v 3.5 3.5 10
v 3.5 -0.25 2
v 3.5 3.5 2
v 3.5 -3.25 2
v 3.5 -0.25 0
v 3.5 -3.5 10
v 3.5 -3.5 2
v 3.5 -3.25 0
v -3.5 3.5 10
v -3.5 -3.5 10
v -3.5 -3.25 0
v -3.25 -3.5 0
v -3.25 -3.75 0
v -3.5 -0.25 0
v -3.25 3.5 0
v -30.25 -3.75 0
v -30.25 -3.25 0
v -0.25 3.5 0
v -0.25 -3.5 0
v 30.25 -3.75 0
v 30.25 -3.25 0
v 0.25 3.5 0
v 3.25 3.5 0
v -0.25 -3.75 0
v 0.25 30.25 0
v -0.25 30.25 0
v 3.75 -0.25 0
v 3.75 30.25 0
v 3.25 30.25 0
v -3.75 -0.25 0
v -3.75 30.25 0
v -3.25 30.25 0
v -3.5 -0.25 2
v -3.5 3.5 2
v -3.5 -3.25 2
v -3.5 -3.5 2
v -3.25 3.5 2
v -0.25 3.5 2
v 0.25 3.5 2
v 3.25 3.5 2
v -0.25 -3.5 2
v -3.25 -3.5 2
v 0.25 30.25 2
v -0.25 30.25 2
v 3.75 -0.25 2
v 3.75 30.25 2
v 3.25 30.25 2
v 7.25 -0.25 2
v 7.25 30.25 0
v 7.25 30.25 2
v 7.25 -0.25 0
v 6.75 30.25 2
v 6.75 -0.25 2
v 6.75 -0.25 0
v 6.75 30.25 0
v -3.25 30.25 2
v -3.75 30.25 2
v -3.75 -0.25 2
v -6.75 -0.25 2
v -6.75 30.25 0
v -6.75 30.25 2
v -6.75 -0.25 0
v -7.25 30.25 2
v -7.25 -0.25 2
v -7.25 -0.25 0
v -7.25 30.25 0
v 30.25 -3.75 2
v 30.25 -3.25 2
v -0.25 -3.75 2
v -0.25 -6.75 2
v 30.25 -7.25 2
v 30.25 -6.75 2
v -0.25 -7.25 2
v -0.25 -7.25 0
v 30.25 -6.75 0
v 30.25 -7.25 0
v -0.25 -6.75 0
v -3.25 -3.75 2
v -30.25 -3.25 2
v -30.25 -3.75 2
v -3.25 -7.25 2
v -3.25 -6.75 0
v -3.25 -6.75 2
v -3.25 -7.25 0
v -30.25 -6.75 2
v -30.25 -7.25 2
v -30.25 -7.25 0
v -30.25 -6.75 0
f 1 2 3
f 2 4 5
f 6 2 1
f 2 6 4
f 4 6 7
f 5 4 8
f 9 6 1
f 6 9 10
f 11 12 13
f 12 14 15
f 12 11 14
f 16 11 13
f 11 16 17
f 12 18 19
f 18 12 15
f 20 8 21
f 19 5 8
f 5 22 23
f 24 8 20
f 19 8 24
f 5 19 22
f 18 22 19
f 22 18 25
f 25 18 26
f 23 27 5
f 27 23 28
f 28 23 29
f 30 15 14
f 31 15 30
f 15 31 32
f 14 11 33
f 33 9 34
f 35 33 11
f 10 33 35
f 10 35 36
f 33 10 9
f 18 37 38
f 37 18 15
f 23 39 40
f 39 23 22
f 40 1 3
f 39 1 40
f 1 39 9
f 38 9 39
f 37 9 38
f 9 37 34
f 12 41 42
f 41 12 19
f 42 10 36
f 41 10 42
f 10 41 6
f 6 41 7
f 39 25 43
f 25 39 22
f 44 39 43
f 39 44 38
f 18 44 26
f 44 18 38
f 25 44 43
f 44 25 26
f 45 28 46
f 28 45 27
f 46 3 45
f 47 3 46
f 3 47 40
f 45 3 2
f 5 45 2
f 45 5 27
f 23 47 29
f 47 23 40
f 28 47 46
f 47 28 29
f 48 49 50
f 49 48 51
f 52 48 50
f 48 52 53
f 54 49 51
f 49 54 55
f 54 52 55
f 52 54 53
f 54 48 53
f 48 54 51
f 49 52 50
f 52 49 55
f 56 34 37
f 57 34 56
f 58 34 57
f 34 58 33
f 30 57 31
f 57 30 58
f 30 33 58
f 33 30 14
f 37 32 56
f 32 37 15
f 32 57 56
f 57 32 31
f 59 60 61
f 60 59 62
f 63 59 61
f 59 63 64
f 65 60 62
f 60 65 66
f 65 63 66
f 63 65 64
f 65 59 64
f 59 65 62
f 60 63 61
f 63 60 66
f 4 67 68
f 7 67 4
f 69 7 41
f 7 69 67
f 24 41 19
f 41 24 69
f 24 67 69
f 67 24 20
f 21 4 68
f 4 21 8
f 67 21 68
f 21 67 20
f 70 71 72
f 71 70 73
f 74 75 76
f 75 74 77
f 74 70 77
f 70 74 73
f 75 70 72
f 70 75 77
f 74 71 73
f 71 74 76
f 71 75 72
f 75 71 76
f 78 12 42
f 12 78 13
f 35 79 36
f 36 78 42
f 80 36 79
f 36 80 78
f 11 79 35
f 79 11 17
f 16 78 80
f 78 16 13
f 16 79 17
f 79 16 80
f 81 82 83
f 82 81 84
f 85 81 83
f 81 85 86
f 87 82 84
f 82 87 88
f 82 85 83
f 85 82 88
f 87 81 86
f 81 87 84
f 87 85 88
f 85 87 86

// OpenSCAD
translate([0, 0, 5]) color([0,1,0,0.9]) cube([7, 7, 10], center=true);
translate([0.0, 0.0, 1]) color([1,0,0]) cube([0.5, 0.5, 2], center=true);
translate([0.0, 0.5, 1]) color([1,0,0]) cube([0.5, 0.5, 2], center=true);
translate([0.0, 1.0, 1]) color([1,0,0]) cube([0.5, 0.5, 2], center=true);
translate([0.0, 1.5, 1]) color([1,0,0]) cube([0.5, 0.5, 2], center=true);
translate([0.0, 2.0, 1]) color([1,0,0]) cube([0.5, 0.5, 2], center=true);
translate([0.0, 2.5, 1]) color([1,0,0]) cube([0.5, 0.5, 2], center=true);
translate([0.0, 3.0, 1]) color([1,0,0]) cube([0.5, 0.5, 2], center=true);
translate([0.0, 3.5, 1]) color([1,0,0]) cube([0.5, 0.5, 2], center=true);
translate([0.0, 4.0, 1]) color([1,0,0]) cube([0.5, 0.5, 2], center=true);
translate([0.0, 4.5, 1]) color([1,0,0]) cube([0.5, 0.5, 2], center=true);
translate([0.0, 5.0, 1]) color([1,0,0]) cube([0.5, 0.5, 2], center=true);
translate([0.0, 5.5, 1]) color([1,0,0]) cube([0.5, 0.5, 2], center=true);
translate([0.0, 6.0, 1]) color([1,0,0]) cube([0.5, 0.5, 2], center=true);
translate([0.0, 6.5, 1]) color([1,0,0]) cube([0.5, 0.5, 2], center=true);
translate([0.0, 7.0, 1]) color([1,0,0]) cube([0.5, 0.5, 2], center=true);
translate([0.0, 7.5, 1]) color([1,0,0]) cube([0.5, 0.5, 2], center=true);
translate([0.0, 8.0, 1]) color([1,0,0]) cube([0.5, 0.5, 2], center=true);
translate([0.0, 8.5, 1]) color([1,0,0]) cube([0.5, 0.5, 2], center=true);
translate([0.0, 9.0, 1]) color([1,0,0]) cube([0.5, 0.5, 2], center=true);
translate([0.0, 9.5, 1]) color([1,0,0]) cube([0.5, 0.5, 2], center=true);
translate([0.0, 10.0, 1]) color([1,0,0]) cube([0.5, 0.5, 2], center=true);
translate([0.0, 10.5, 1]) color([1,0,0]) cube([0.5, 0.5, 2], center=true);
translate([0.0, 11.0, 1]) color([1,0,0]) cube([0.5, 0.5, 2], center=true);
translate([0.0, 11.5, 1]) color([1,0,0]) cube([0.5, 0.5, 2], center=true);
translate([0.0, 12.0, 1]) color([1,0,0]) cube([0.5, 0.5, 2], center=true);
translate([0.0, 12.5, 1]) color([1,0,0]) cube([0.5, 0.5, 2], center=true);
translate([0.0, 13.0, 1]) color([1,0,0]) cube([0.5, 0.5, 2], center=true);
translate([0.0, 13.5, 1]) color([1,0,0]) cube([0.5, 0.5, 2], center=true);
translate([0.0, 14.0, 1]) color([1,0,0]) cube([0.5, 0.5, 2], center=true);
translate([0.0, 14.5, 1]) color([1,0,0]) cube([0.5, 0.5, 2], center=true);
translate([0.0, 15.0, 1]) color([1,0,0]) cube([0.5, 0.5, 2], center=true);
translate([0.0, 15.5, 1]) color([1,0,0]) cube([0.5, 0.5, 2], center=true);
translate([0.0, 16.0, 1]) color([1,0,0]) cube([0.5, 0.5, 2], center=true);
translate([0.0, 16.5, 1]) color([1,0,0]) cube([0.5, 0.5, 2], center=true);
translate([0.0, 17.0, 1]) color([1,0,0]) cube([0.5, 0.5, 2], center=true);
translate([0.0, 17.5, 1]) color([1,0,0]) cube([0.5, 0.5, 2], center=true);
translate([0.0, 18.0, 1]) color([1,0,0]) cube([0.5, 0.5, 2], center=true);
translate([0.0, 18.5, 1]) color([1,0,0]) cube([0.5, 0.5, 2], center=true);
translate([0.0, 19.0, 1]) color([1,0,0]) cube([0.5, 0.5, 2], center=true);
translate([0.0, 19.5, 1]) color([1,0,0]) cube([0.5, 0.5, 2], center=true);
translate([0.0, 20.0, 1]) color([1,0,0]) cube([0.5, 0.5, 2], center=true);
translate([0.0, 20.5, 1]) color([1,0,0]) cube([0.5, 0.5, 2], center=true);
translate([0.0, 21.0, 1]) color([1,0,0]) cube([0.5, 0.5, 2], center=true);
translate([0.0, 21.5, 1]) color([1,0,0]) cube([0.5, 0.5, 2], center=true);
translate([0.0, 22.0, 1]) color([1,0,0]) cube([0.5, 0.5, 2], center=true);
translate([0.0, 22.5, 1]) color([1,0,0]) cube([0.5, 0.5, 2], center=true);
translate([0.0, 23.0, 1]) color([1,0,0]) cube([0.5, 0.5, 2], center=true);
translate([0.0, 23.5, 1]) color([1,0,0]) cube([0.5, 0.5, 2], center=true);
translate([0.0, 24.0, 1]) color([1,0,0]) cube([0.5, 0.5, 2], center=true);
translate([0.0, 24.5, 1]) color([1,0,0]) cube([0.5, 0.5, 2], center=true);
translate([0.0, 25.0, 1]) color([1,0,0]) cube([0.5, 0.5, 2], center=true);
translate([0.0, 25.5, 1]) color([1,0,0]) cube([0.5, 0.5, 2], center=true);
translate([0.0, 26.0, 1]) color([1,0,0]) cube([0.5, 0.5, 2], center=true);
translate([0.0, 26.5, 1]) color([1,0,0]) cube([0.5, 0.5, 2], center=true);
translate([0.0, 27.0, 1]) color([1,0,0]) cube([0.5, 0.5, 2], center=true);
translate([0.0, 27.5, 1]) color([1,0,0]) cube([0.5, 0.5, 2], center=true);
translate([0.0, 28.0, 1]) color([1,0,0]) cube([0.5, 0.5, 2], center=true);
translate([0.0, 28.5, 1]) color([1,0,0]) cube([0.5, 0.5, 2], center=true);
translate([0.0, 29.0, 1]) color([1,0,0]) cube([0.5, 0.5, 2], center=true);
translate([0.0, 29.5, 1]) color([1,0,0]) cube([0.5, 0.5, 2], center=true);
translate([0.0, 30.0, 1]) color([1,0,0]) cube([0.5, 0.5, 2], center=true);
translate([3.5, 0.0, 1]) color([1,0,0]) cube([0.5, 0.5, 2], center=true);
translate([3.5, 0.5, 1]) color([1,0,0]) cube([0.5, 0.5, 2], center=true);
translate([3.5, 1.0, 1]) color([1,0,0]) cube([0.5, 0.5, 2], center=true);
translate([3.5, 1.5, 1]) color([1,0,0]) cube([0.5, 0.5, 2], center=true);
translate([3.5, 2.0, 1]) color([1,0,0]) cube([0.5, 0.5, 2], center=true);
translate([3.5, 2.5, 1]) color([1,0,0]) cube([0.5, 0.5, 2], center=true);
translate([3.5, 3.0, 1]) color([1,0,0]) cube([0.5, 0.5, 2], center=true);
translate([3.5, 3.5, 1]) color([1,0,0]) cube([0.5, 0.5, 2], center=true);
translate([3.5, 4.0, 1]) color([1,0,0]) cube([0.5, 0.5, 2], center=true);
translate([3.5, 4.5, 1]) color([1,0,0]) cube([0.5, 0.5, 2], center=true);
translate([3.5, 5.0, 1]) color([1,0,0]) cube([0.5, 0.5, 2], center=true);
translate([3.5, 5.5, 1]) color([1,0,0]) cube([0.5, 0.5, 2], center=true);
translate([3.5, 6.0, 1]) color([1,0,0]) cube([0.5, 0.5, 2], center=true);
translate([3.5, 6.5, 1]) color([1,0,0]) cube([0.5, 0.5, 2], center=true);
translate([3.5, 7.0, 1]) color([1,0,0]) cube([0.5, 0.5, 2], center=true);
translate([3.5, 7.5, 1]) color([1,0,0]) cube([0.5, 0.5, 2], center=true);
translate([3.5, 8.0, 1]) color([1,0,0]) cube([0.5, 0.5, 2], center=true);
translate([3.5, 8.5, 1]) color([1,0,0]) cube([0.5, 0.5, 2], center=true);
translate([3.5, 9.0, 1]) color([1,0,0]) cube([0.5, 0.5, 2], center=true);
translate([3.5, 9.5, 1]) color([1,0,0]) cube([0.5, 0.5, 2], center=true);
translate([3.5, 10.0, 1]) color([1,0,0]) cube([0.5, 0.5, 2], center=true);
translate([3.5, 10.5, 1]) color([1,0,0]) cube([0.5, 0.5, 2], center=true);
translate([3.5, 11.0, 1]) color([1,0,0]) cube([0.5, 0.5, 2], center=true);
translate([3.5, 11.5, 1]) color([1,0,0]) cube([0.5, 0.5, 2], center=true);
translate([3.5, 12.0, 1]) color([1,0,0]) cube([0.5, 0.5, 2], center=true);
translate([3.5, 12.5, 1]) color([1,0,0]) cube([0.5, 0.5, 2], center=true);
translate([3.5, 13.0, 1]) color([1,0,0]) cube([0.5, 0.5, 2], center=true);
translate([3.5, 13.5, 1]) color([1,0,0]) cube([0.5, 0.5, 2], center=true);
translate([3.5, 14.0, 1]) color([1,0,0]) cube([0.5, 0.5, 2], center=true);
translate([3.5, 14.5, 1]) color([1,0,0]) cube([0.5, 0.5, 2], center=true);
translate([3.5, 15.0, 1]) color([1,0,0]) cube([0.5, 0.5, 2], center=true);
translate([3.5, 15.5, 1]) color([1,0,0]) cube([0.5, 0.5, 2], center=true);
translate([3.5, 16.0, 1]) color([1,0,0]) cube([0.5, 0.5, 2], center=true);
translate([3.5, 16.5, 1]) color([1,0,0]) cube([0.5, 0.5, 2], center=true);
translate([3.5, 17.0, 1]) color([1,0,0]) cube([0.5, 0.5, 2], center=true);
translate([3.5, 17.5, 1]) color([1,0,0]) cube([0.5, 0.5, 2], center=true);
translate([3.5, 18.0, 1]) color([1,0,0]) cube([0.5, 0.5, 2], center=true);
translate([3.5, 18.5, 1]) color([1,0,0]) cube([0.5, 0.5, 2], center=true);
translate([3.5, 19.0, 1]) color([1,0,0]) cube([0.5, 0.5, 2], center=true);
translate([3.5, 19.5, 1]) color([1,0,0]) cube([0.5, 0.5, 2], center=true);
translate([3.5, 20.0, 1]) color([1,0,0]) cube([0.5, 0.5, 2], center=true);
translate([3.5, 20.5, 1]) color([1,0,0]) cube([0.5, 0.5, 2], center=true);
translate([3.5, 21.0, 1]) color([1,0,0]) cube([0.5, 0.5, 2], center=true);
translate([3.5, 21.5, 1]) color([1,0,0]) cube([0.5, 0.5, 2], center=true);
translate([3.5, 22.0, 1]) color([1,0,0]) cube([0.5, 0.5, 2], center=true);
translate([3.5, 22.5, 1]) color([1,0,0]) cube([0.5, 0.5, 2], center=true);
translate([3.5, 23.0, 1]) color([1,0,0]) cube([0.5, 0.5, 2], center=true);
translate([3.5, 23.5, 1]) color([1,0,0]) cube([0.5, 0.5, 2], center=true);
translate([3.5, 24.0, 1]) color([1,0,0]) cube([0.5, 0.5, 2], center=true);
translate([3.5, 24.5, 1]) color([1,0,0]) cube([0.5, 0.5, 2], center=true);
translate([3.5, 25.0, 1]) color([1,0,0]) cube([0.5, 0.5, 2], center=true);
translate([3.5, 25.5, 1]) color([1,0,0]) cube([0.5, 0.5, 2], center=true);
translate([3.5, 26.0, 1]) color([1,0,0]) cube([0.5, 0.5, 2], center=true);
translate([3.5, 26.5, 1]) color([1,0,0]) cube([0.5, 0.5, 2], center=true);
translate([3.5, 27.0, 1]) color([1,0,0]) cube([0.5, 0.5, 2], center=true);
translate([3.5, 27.5, 1]) color([1,0,0]) cube([0.5, 0.5, 2], center=true);
translate([3.5, 28.0, 1]) color([1,0,0]) cube([0.5, 0.5, 2], center=true);
translate([3.5, 28.5, 1]) color([1,0,0]) cube([0.5, 0.5, 2], center=true);
translate([3.5, 29.0, 1]) color([1,0,0]) cube([0.5, 0.5, 2], center=true);
translate([3.5, 29.5, 1]) color([1,0,0]) cube([0.5, 0.5, 2], center=true);
translate([3.5, 30.0, 1]) color([1,0,0]) cube([0.5, 0.5, 2], center=true);
translate([7.0, 0.0, 1]) color([1,0,0]) cube([0.5, 0.5, 2], center=true);
translate([7.0, 0.5, 1]) color([1,0,0]) cube([0.5, 0.5, 2], center=true);
translate([7.0, 1.0, 1]) color([1,0,0]) cube([0.5, 0.5, 2], center=true);
translate([7.0, 1.5, 1]) color([1,0,0]) cube([0.5, 0.5, 2], center=true);
translate([7.0, 2.0, 1]) color([1,0,0]) cube([0.5, 0.5, 2], center=true);
translate([7.0, 2.5, 1]) color([1,0,0]) cube([0.5, 0.5, 2], center=true);
translate([7.0, 3.0, 1]) color([1,0,0]) cube([0.5, 0.5, 2], center=true);
translate([7.0, 3.5, 1]) color([1,0,0]) cube([0.5, 0.5, 2], center=true);
translate([7.0, 4.0, 1]) color([1,0,0]) cube([0.5, 0.5, 2], center=true);
translate([7.0, 4.5, 1]) color([1,0,0]) cube([0.5, 0.5, 2], center=true);
translate([7.0, 5.0, 1]) color([1,0,0]) cube([0.5, 0.5, 2], center=true);
translate([7.0, 5.5, 1]) color([1,0,0]) cube([0.5, 0.5, 2], center=true);
translate([7.0, 6.0, 1]) color([1,0,0]) cube([0.5, 0.5, 2], center=true);
translate([7.0, 6.5, 1]) color([1,0,0]) cube([0.5, 0.5, 2], center=true);
translate([7.0, 7.0, 1]) color([1,0,0]) cube([0.5, 0.5, 2], center=true);
translate([7.0, 7.5, 1]) color([1,0,0]) cube([0.5, 0.5, 2], center=true);
translate([7.0, 8.0, 1]) color([1,0,0]) cube([0.5, 0.5, 2], center=true);
translate([7.0, 8.5, 1]) color([1,0,0]) cube([0.5, 0.5, 2], center=true);
translate([7.0, 9.0, 1]) color([1,0,0]) cube([0.5, 0.5, 2], center=true);
translate([7.0, 9.5, 1]) color([1,0,0]) cube([0.5, 0.5, 2], center=true);
translate([7.0, 10.0, 1]) color([1,0,0]) cube([0.5, 0.5, 2], center=true);
translate([7.0, 10.5, 1]) color([1,0,0]) cube([0.5, 0.5, 2], center=true);
translate([7.0, 11.0, 1]) color([1,0,0]) cube([0.5, 0.5, 2], center=true);
translate([7.0, 11.5, 1]) color([1,0,0]) cube([0.5, 0.5, 2], center=true);
translate([7.0, 12.0, 1]) color([1,0,0]) cube([0.5, 0.5, 2], center=true);
translate([7.0, 12.5, 1]) color([1,0,0]) cube([0.5, 0.5, 2], center=true);
translate([7.0, 13.0, 1]) color([1,0,0]) cube([0.5, 0.5, 2], center=true);
translate([7.0, 13.5, 1]) color([1,0,0]) cube([0.5, 0.5, 2], center=true);
translate([7.0, 14.0, 1]) color([1,0,0]) cube([0.5, 0.5, 2], center=true);
translate([7.0, 14.5, 1]) color([1,0,0]) cube([0.5, 0.5, 2], center=true);
translate([7.0, 15.0, 1]) color([1,0,0]) cube([0.5, 0.5, 2], center=true);
translate([7.0, 15.5, 1]) color([1,0,0]) cube([0.5, 0.5, 2], center=true);
translate([7.0, 16.0, 1]) color([1,0,0]) cube([0.5, 0.5, 2], center=true);
translate([7.0, 16.5, 1]) color([1,0,0]) cube([0.5, 0.5, 2], center=true);
translate([7.0, 17.0, 1]) color([1,0,0]) cube([0.5, 0.5, 2], center=true);
translate([7.0, 17.5, 1]) color([1,0,0]) cube([0.5, 0.5, 2], center=true);
translate([7.0, 18.0, 1]) color([1,0,0]) cube([0.5, 0.5, 2], center=true);
translate([7.0, 18.5, 1]) color([1,0,0]) cube([0.5, 0.5, 2], center=true);
translate([7.0, 19.0, 1]) color([1,0,0]) cube([0.5, 0.5, 2], center=true);
translate([7.0, 19.5, 1]) color([1,0,0]) cube([0.5, 0.5, 2], center=true);
translate([7.0, 20.0, 1]) color([1,0,0]) cube([0.5, 0.5, 2], center=true);
translate([7.0, 20.5, 1]) color([1,0,0]) cube([0.5, 0.5, 2], center=true);
translate([7.0, 21.0, 1]) color([1,0,0]) cube([0.5, 0.5, 2], center=true);
translate([7.0, 21.5, 1]) color([1,0,0]) cube([0.5, 0.5, 2], center=true);
translate([7.0, 22.0, 1]) color([1,0,0]) cube([0.5, 0.5, 2], center=true);
translate([7.0, 22.5, 1]) color([1,0,0]) cube([0.5, 0.5, 2], center=true);
translate([7.0, 23.0, 1]) color([1,0,0]) cube([0.5, 0.5, 2], center=true);
translate([7.0, 23.5, 1]) color([1,0,0]) cube([0.5, 0.5, 2], center=true);
translate([7.0, 24.0, 1]) color([1,0,0]) cube([0.5, 0.5, 2], center=true);
translate([7.0, 24.5, 1]) color([1,0,0]) cube([0.5, 0.5, 2], center=true);
translate([7.0, 25.0, 1]) color([1,0,0]) cube([0.5, 0.5, 2], center=true);
translate([7.0, 25.5, 1]) color([1,0,0]) cube([0.5, 0.5, 2], center=true);
translate([7.0, 26.0, 1]) color([1,0,0]) cube([0.5, 0.5, 2], center=true);
translate([7.0, 26.5, 1]) color([1,0,0]) cube([0.5, 0.5, 2], center=true);
translate([7.0, 27.0, 1]) color([1,0,0]) cube([0.5, 0.5, 2], center=true);
translate([7.0, 27.5, 1]) color([1,0,0]) cube([0.5, 0.5, 2], center=true);
translate([7.0, 28.0, 1]) color([1,0,0]) cube([0.5, 0.5, 2], center=true);
translate([7.0, 28.5, 1]) color([1,0,0]) cube([0.5, 0.5, 2], center=true);
translate([7.0, 29.0, 1]) color([1,0,0]) cube([0.5, 0.5, 2], center=true);
translate([7.0, 29.5, 1]) color([1,0,0]) cube([0.5, 0.5, 2], center=true);
translate([7.0, 30.0, 1]) color([1,0,0]) cube([0.5, 0.5, 2], center=true);
translate([-3.5, 0.0, 1]) color([1,0,0]) cube([0.5, 0.5, 2], center=true);
translate([-3.5, 0.5, 1]) color([1,0,0]) cube([0.5, 0.5, 2], center=true);
translate([-3.5, 1.0, 1]) color([1,0,0]) cube([0.5, 0.5, 2], center=true);
translate([-3.5, 1.5, 1]) color([1,0,0]) cube([0.5, 0.5, 2], center=true);
translate([-3.5, 2.0, 1]) color([1,0,0]) cube([0.5, 0.5, 2], center=true);
translate([-3.5, 2.5, 1]) color([1,0,0]) cube([0.5, 0.5, 2], center=true);
translate([-3.5, 3.0, 1]) color([1,0,0]) cube([0.5, 0.5, 2], center=true);
translate([-3.5, 3.5, 1]) color([1,0,0]) cube([0.5, 0.5, 2], center=true);
translate([-3.5, 4.0, 1]) color([1,0,0]) cube([0.5, 0.5, 2], center=true);
translate([-3.5, 4.5, 1]) color([1,0,0]) cube([0.5, 0.5, 2], center=true);
translate([-3.5, 5.0, 1]) color([1,0,0]) cube([0.5, 0.5, 2], center=true);
translate([-3.5, 5.5, 1]) color([1,0,0]) cube([0.5, 0.5, 2], center=true);
translate([-3.5, 6.0, 1]) color([1,0,0]) cube([0.5, 0.5, 2], center=true);
translate([-3.5, 6.5, 1]) color([1,0,0]) cube([0.5, 0.5, 2], center=true);
translate([-3.5, 7.0, 1]) color([1,0,0]) cube([0.5, 0.5, 2], center=true);
translate([-3.5, 7.5, 1]) color([1,0,0]) cube([0.5, 0.5, 2], center=true);
translate([-3.5, 8.0, 1]) color([1,0,0]) cube([0.5, 0.5, 2], center=true);
translate([-3.5, 8.5, 1]) color([1,0,0]) cube([0.5, 0.5, 2], center=true);
translate([-3.5, 9.0, 1]) color([1,0,0]) cube([0.5, 0.5, 2], center=true);
translate([-3.5, 9.5, 1]) color([1,0,0]) cube([0.5, 0.5, 2], center=true);
translate([-3.5, 10.0, 1]) color([1,0,0]) cube([0.5, 0.5, 2], center=true);
translate([-3.5, 10.5, 1]) color([1,0,0]) cube([0.5, 0.5, 2], center=true);
translate([-3.5, 11.0, 1]) color([1,0,0]) cube([0.5, 0.5, 2], center=true);
translate([-3.5, 11.5, 1]) color([1,0,0]) cube([0.5, 0.5, 2], center=true);
translate([-3.5, 12.0, 1]) color([1,0,0]) cube([0.5, 0.5, 2], center=true);
translate([-3.5, 12.5, 1]) color([1,0,0]) cube([0.5, 0.5, 2], center=true);
translate([-3.5, 13.0, 1]) color([1,0,0]) cube([0.5, 0.5, 2], center=true);
translate([-3.5, 13.5, 1]) color([1,0,0]) cube([0.5, 0.5, 2], center=true);
translate([-3.5, 14.0, 1]) color([1,0,0]) cube([0.5, 0.5, 2], center=true);
translate([-3.5, 14.5, 1]) color([1,0,0]) cube([0.5, 0.5, 2], center=true);
translate([-3.5, 15.0, 1]) color([1,0,0]) cube([0.5, 0.5, 2], center=true);
translate([-3.5, 15.5, 1]) color([1,0,0]) cube([0.5, 0.5, 2], center=true);
translate([-3.5, 16.0, 1]) color([1,0,0]) cube([0.5, 0.5, 2], center=true);
translate([-3.5, 16.5, 1]) color([1,0,0]) cube([0.5, 0.5, 2], center=true);
translate([-3.5, 17.0, 1]) color([1,0,0]) cube([0.5, 0.5, 2], center=true);
translate([-3.5, 17.5, 1]) color([1,0,0]) cube([0.5, 0.5, 2], center=true);
translate([-3.5, 18.0, 1]) color([1,0,0]) cube([0.5, 0.5, 2], center=true);
translate([-3.5, 18.5, 1]) color([1,0,0]) cube([0.5, 0.5, 2], center=true);
translate([-3.5, 19.0, 1]) color([1,0,0]) cube([0.5, 0.5, 2], center=true);
translate([-3.5, 19.5, 1]) color([1,0,0]) cube([0.5, 0.5, 2], center=true);
translate([-3.5, 20.0, 1]) color([1,0,0]) cube([0.5, 0.5, 2], center=true);
translate([-3.5, 20.5, 1]) color([1,0,0]) cube([0.5, 0.5, 2], center=true);
translate([-3.5, 21.0, 1]) color([1,0,0]) cube([0.5, 0.5, 2], center=true);
translate([-3.5, 21.5, 1]) color([1,0,0]) cube([0.5, 0.5, 2], center=true);
translate([-3.5, 22.0, 1]) color([1,0,0]) cube([0.5, 0.5, 2], center=true);
translate([-3.5, 22.5, 1]) color([1,0,0]) cube([0.5, 0.5, 2], center=true);
translate([-3.5, 23.0, 1]) color([1,0,0]) cube([0.5, 0.5, 2], center=true);
translate([-3.5, 23.5, 1]) color([1,0,0]) cube([0.5, 0.5, 2], center=true);
translate([-3.5, 24.0, 1]) color([1,0,0]) cube([0.5, 0.5, 2], center=true);
translate([-3.5, 24.5, 1]) color([1,0,0]) cube([0.5, 0.5, 2], center=true);
translate([-3.5, 25.0, 1]) color([1,0,0]) cube([0.5, 0.5, 2], center=true);
translate([-3.5, 25.5, 1]) color([1,0,0]) cube([0.5, 0.5, 2], center=true);
translate([-3.5, 26.0, 1]) color([1,0,0]) cube([0.5, 0.5, 2], center=true);
translate([-3.5, 26.5, 1]) color([1,0,0]) cube([0.5, 0.5, 2], center=true);
translate([-3.5, 27.0, 1]) color([1,0,0]) cube([0.5, 0.5, 2], center=true);
translate([-3.5, 27.5, 1]) color([1,0,0]) cube([0.5, 0.5, 2], center=true);
translate([-3.5, 28.0, 1]) color([1,0,0]) cube([0.5, 0.5, 2], center=true);
translate([-3.5, 28.5, 1]) color([1,0,0]) cube([0.5, 0.5, 2], center=true);
translate([-3.5, 29.0, 1]) color([1,0,0]) cube([0.5, 0.5, 2], center=true);
translate([-3.5, 29.5, 1]) color([1,0,0]) cube([0.5, 0.5, 2], center=true);
translate([-3.5, 30.0, 1]) color([1,0,0]) cube([0.5, 0.5, 2], center=true);
translate([-7.0, 0.0, 1]) color([1,0,0]) cube([0.5, 0.5, 2], center=true);
translate([-7.0, 0.5, 1]) color([1,0,0]) cube([0.5, 0.5, 2], center=true);
translate([-7.0, 1.0, 1]) color([1,0,0]) cube([0.5, 0.5, 2], center=true);
translate([-7.0, 1.5, 1]) color([1,0,0]) cube([0.5, 0.5, 2], center=true);
translate([-7.0, 2.0, 1]) color([1,0,0]) cube([0.5, 0.5, 2], center=true);
translate([-7.0, 2.5, 1]) color([1,0,0]) cube([0.5, 0.5, 2], center=true);
translate([-7.0, 3.0, 1]) color([1,0,0]) cube([0.5, 0.5, 2], center=true);
translate([-7.0, 3.5, 1]) color([1,0,0]) cube([0.5, 0.5, 2], center=true);
translate([-7.0, 4.0, 1]) color([1,0,0]) cube([0.5, 0.5, 2], center=true);
translate([-7.0, 4.5, 1]) color([1,0,0]) cube([0.5, 0.5, 2], center=true);
translate([-7.0, 5.0, 1]) color([1,0,0]) cube([0.5, 0.5, 2], center=true);
translate([-7.0, 5.5, 1]) color([1,0,0]) cube([0.5, 0.5, 2], center=true);
translate([-7.0, 6.0, 1]) color([1,0,0]) cube([0.5, 0.5, 2], center=true);
translate([-7.0, 6.5, 1]) color([1,0,0]) cube([0.5, 0.5, 2], center=true);
translate([-7.0, 7.0, 1]) color([1,0,0]) cube([0.5, 0.5, 2], center=true);
translate([-7.0, 7.5, 1]) color([1,0,0]) cube([0.5, 0.5, 2], center=true);
translate([-7.0, 8.0, 1]) color([1,0,0]) cube([0.5, 0.5, 2], center=true);
translate([-7.0, 8.5, 1]) color([1,0,0]) cube([0.5, 0.5, 2], center=true);
translate([-7.0, 9.0, 1]) color([1,0,0]) cube([0.5, 0.5, 2], center=true);
translate([-7.0, 9.5, 1]) color([1,0,0]) cube([0.5, 0.5, 2], center=true);
translate([-7.0, 10.0, 1]) color([1,0,0]) cube([0.5, 0.5, 2], center=true);
translate([-7.0, 10.5, 1]) color([1,0,0]) cube([0.5, 0.5, 2], center=true);
translate([-7.0, 11.0, 1]) color([1,0,0]) cube([0.5, 0.5, 2], center=true);
translate([-7.0, 11.5, 1]) color([1,0,0]) cube([0.5, 0.5, 2], center=true);
translate([-7.0, 12.0, 1]) color([1,0,0]) cube([0.5, 0.5, 2], center=true);
translate([-7.0, 12.5, 1]) color([1,0,0]) cube([0.5, 0.5, 2], center=true);
translate([-7.0, 13.0, 1]) color([1,0,0]) cube([0.5, 0.5, 2], center=true);
translate([-7.0, 13.5, 1]) color([1,0,0]) cube([0.5, 0.5, 2], center=true);
translate([-7.0, 14.0, 1]) color([1,0,0]) cube([0.5, 0.5, 2], center=true);
translate([-7.0, 14.5, 1]) color([1,0,0]) cube([0.5, 0.5, 2], center=true);
translate([-7.0, 15.0, 1]) color([1,0,0]) cube([0.5, 0.5, 2], center=true);
translate([-7.0, 15.5, 1]) color([1,0,0]) cube([0.5, 0.5, 2], center=true);
translate([-7.0, 16.0, 1]) color([1,0,0]) cube([0.5, 0.5, 2], center=true);
translate([-7.0, 16.5, 1]) color([1,0,0]) cube([0.5, 0.5, 2], center=true);
translate([-7.0, 17.0, 1]) color([1,0,0]) cube([0.5, 0.5, 2], center=true);
translate([-7.0, 17.5, 1]) color([1,0,0]) cube([0.5, 0.5, 2], center=true);
translate([-7.0, 18.0, 1]) color([1,0,0]) cube([0.5, 0.5, 2], center=true);
translate([-7.0, 18.5, 1]) color([1,0,0]) cube([0.5, 0.5, 2], center=true);
translate([-7.0, 19.0, 1]) color([1,0,0]) cube([0.5, 0.5, 2], center=true);
translate([-7.0, 19.5, 1]) color([1,0,0]) cube([0.5, 0.5, 2], center=true);
translate([-7.0, 20.0, 1]) color([1,0,0]) cube([0.5, 0.5, 2], center=true);
translate([-7.0, 20.5, 1]) color([1,0,0]) cube([0.5, 0.5, 2], center=true);
translate([-7.0, 21.0, 1]) color([1,0,0]) cube([0.5, 0.5, 2], center=true);
translate([-7.0, 21.5, 1]) color([1,0,0]) cube([0.5, 0.5, 2], center=true);
translate([-7.0, 22.0, 1]) color([1,0,0]) cube([0.5, 0.5, 2], center=true);
translate([-7.0, 22.5, 1]) color([1,0,0]) cube([0.5, 0.5, 2], center=true);
translate([-7.0, 23.0, 1]) color([1,0,0]) cube([0.5, 0.5, 2], center=true);
translate([-7.0, 23.5, 1]) color([1,0,0]) cube([0.5, 0.5, 2], center=true);
translate([-7.0, 24.0, 1]) color([1,0,0]) cube([0.5, 0.5, 2], center=true);
translate([-7.0, 24.5, 1]) color([1,0,0]) cube([0.5, 0.5, 2], center=true);
translate([-7.0, 25.0, 1]) color([1,0,0]) cube([0.5, 0.5, 2], center=true);
translate([-7.0, 25.5, 1]) color([1,0,0]) cube([0.5, 0.5, 2], center=true);
translate([-7.0, 26.0, 1]) color([1,0,0]) cube([0.5, 0.5, 2], center=true);
translate([-7.0, 26.5, 1]) color([1,0,0]) cube([0.5, 0.5, 2], center=true);
translate([-7.0, 27.0, 1]) color([1,0,0]) cube([0.5, 0.5, 2], center=true);
translate([-7.0, 27.5, 1]) color([1,0,0]) cube([0.5, 0.5, 2], center=true);
translate([-7.0, 28.0, 1]) color([1,0,0]) cube([0.5, 0.5, 2], center=true);
translate([-7.0, 28.5, 1]) color([1,0,0]) cube([0.5, 0.5, 2], center=true);
translate([-7.0, 29.0, 1]) color([1,0,0]) cube([0.5, 0.5, 2], center=true);
translate([-7.0, 29.5, 1]) color([1,0,0]) cube([0.5, 0.5, 2], center=true);
translate([-7.0, 30.0, 1]) color([1,0,0]) cube([0.5, 0.5, 2], center=true);
translate([0.0, -3.5, 1]) color([1,0,0]) cube([0.5, 0.5, 2], center=true);
translate([0.5, -3.5, 1]) color([1,0,0]) cube([0.5, 0.5, 2], center=true);
translate([1.0, -3.5, 1]) color([1,0,0]) cube([0.5, 0.5, 2], center=true);
translate([1.5, -3.5, 1]) color([1,0,0]) cube([0.5, 0.5, 2], center=true);
translate([2.0, -3.5, 1]) color([1,0,0]) cube([0.5, 0.5, 2], center=true);
translate([2.5, -3.5, 1]) color([1,0,0]) cube([0.5, 0.5, 2], center=true);
translate([3.0, -3.5, 1]) color([1,0,0]) cube([0.5, 0.5, 2], center=true);
translate([3.5, -3.5, 1]) color([1,0,0]) cube([0.5, 0.5, 2], center=true);
translate([4.0, -3.5, 1]) color([1,0,0]) cube([0.5, 0.5, 2], center=true);
translate([4.5, -3.5, 1]) color([1,0,0]) cube([0.5, 0.5, 2], center=true);
translate([5.0, -3.5, 1]) color([1,0,0]) cube([0.5, 0.5, 2], center=true);
translate([5.5, -3.5, 1]) color([1,0,0]) cube([0.5, 0.5, 2], center=true);
translate([6.0, -3.5, 1]) color([1,0,0]) cube([0.5, 0.5, 2], center=true);
translate([6.5, -3.5, 1]) color([1,0,0]) cube([0.5, 0.5, 2], center=true);
translate([7.0, -3.5, 1]) color([1,0,0]) cube([0.5, 0.5, 2], center=true);
translate([7.5, -3.5, 1]) color([1,0,0]) cube([0.5, 0.5, 2], center=true);
translate([8.0, -3.5, 1]) color([1,0,0]) cube([0.5, 0.5, 2], center=true);
translate([8.5, -3.5, 1]) color([1,0,0]) cube([0.5, 0.5, 2], center=true);
translate([9.0, -3.5, 1]) color([1,0,0]) cube([0.5, 0.5, 2], center=true);
translate([9.5, -3.5, 1]) color([1,0,0]) cube([0.5, 0.5, 2], center=true);
translate([10.0, -3.5, 1]) color([1,0,0]) cube([0.5, 0.5, 2], center=true);
translate([10.5, -3.5, 1]) color([1,0,0]) cube([0.5, 0.5, 2], center=true);
translate([11.0, -3.5, 1]) color([1,0,0]) cube([0.5, 0.5, 2], center=true);
translate([11.5, -3.5, 1]) color([1,0,0]) cube([0.5, 0.5, 2], center=true);
translate([12.0, -3.5, 1]) color([1,0,0]) cube([0.5, 0.5, 2], center=true);
translate([12.5, -3.5, 1]) color([1,0,0]) cube([0.5, 0.5, 2], center=true);
translate([13.0, -3.5, 1]) color([1,0,0]) cube([0.5, 0.5, 2], center=true);
translate([13.5, -3.5, 1]) color([1,0,0]) cube([0.5, 0.5, 2], center=true);
translate([14.0, -3.5, 1]) color([1,0,0]) cube([0.5, 0.5, 2], center=true);
translate([14.5, -3.5, 1]) color([1,0,0]) cube([0.5, 0.5, 2], center=true);
translate([15.0, -3.5, 1]) color([1,0,0]) cube([0.5, 0.5, 2], center=true);
translate([15.5, -3.5, 1]) color([1,0,0]) cube([0.5, 0.5, 2], center=true);
translate([16.0, -3.5, 1]) color([1,0,0]) cube([0.5, 0.5, 2], center=true);
translate([16.5, -3.5, 1]) color([1,0,0]) cube([0.5, 0.5, 2], center=true);
translate([17.0, -3.5, 1]) color([1,0,0]) cube([0.5, 0.5, 2], center=true);
translate([17.5, -3.5, 1]) color([1,0,0]) cube([0.5, 0.5, 2], center=true);
translate([18.0, -3.5, 1]) color([1,0,0]) cube([0.5, 0.5, 2], center=true);
translate([18.5, -3.5, 1]) color([1,0,0]) cube([0.5, 0.5, 2], center=true);
translate([19.0, -3.5, 1]) color([1,0,0]) cube([0.5, 0.5, 2], center=true);
translate([19.5, -3.5, 1]) color([1,0,0]) cube([0.5, 0.5, 2], center=true);
translate([20.0, -3.5, 1]) color([1,0,0]) cube([0.5, 0.5, 2], center=true);
translate([20.5, -3.5, 1]) color([1,0,0]) cube([0.5, 0.5, 2], center=true);
translate([21.0, -3.5, 1]) color([1,0,0]) cube([0.5, 0.5, 2], center=true);
translate([21.5, -3.5, 1]) color([1,0,0]) cube([0.5, 0.5, 2], center=true);
translate([22.0, -3.5, 1]) color([1,0,0]) cube([0.5, 0.5, 2], center=true);
translate([22.5, -3.5, 1]) color([1,0,0]) cube([0.5, 0.5, 2], center=true);
translate([23.0, -3.5, 1]) color([1,0,0]) cube([0.5, 0.5, 2], center=true);
translate([23.5, -3.5, 1]) color([1,0,0]) cube([0.5, 0.5, 2], center=true);
translate([24.0, -3.5, 1]) color([1,0,0]) cube([0.5, 0.5, 2], center=true);
translate([24.5, -3.5, 1]) color([1,0,0]) cube([0.5, 0.5, 2], center=true);
translate([25.0, -3.5, 1]) color([1,0,0]) cube([0.5, 0.5, 2], center=true);
translate([25.5, -3.5, 1]) color([1,0,0]) cube([0.5, 0.5, 2], center=true);
translate([26.0, -3.5, 1]) color([1,0,0]) cube([0.5, 0.5, 2], center=true);
translate([26.5, -3.5, 1]) color([1,0,0]) cube([0.5, 0.5, 2], center=true);
translate([27.0, -3.5, 1]) color([1,0,0]) cube([0.5, 0.5, 2], center=true);
translate([27.5, -3.5, 1]) color([1,0,0]) cube([0.5, 0.5, 2], center=true);
translate([28.0, -3.5, 1]) color([1,0,0]) cube([0.5, 0.5, 2], center=true);
translate([28.5, -3.5, 1]) color([1,0,0]) cube([0.5, 0.5, 2], center=true);
translate([29.0, -3.5, 1]) color([1,0,0]) cube([0.5, 0.5, 2], center=true);
translate([29.5, -3.5, 1]) color([1,0,0]) cube([0.5, 0.5, 2], center=true);
translate([30.0, -3.5, 1]) color([1,0,0]) cube([0.5, 0.5, 2], center=true);
translate([0.0, -7.0, 1]) color([1,0,0]) cube([0.5, 0.5, 2], center=true);
translate([0.5, -7.0, 1]) color([1,0,0]) cube([0.5, 0.5, 2], center=true);
translate([1.0, -7.0, 1]) color([1,0,0]) cube([0.5, 0.5, 2], center=true);
translate([1.5, -7.0, 1]) color([1,0,0]) cube([0.5, 0.5, 2], center=true);
translate([2.0, -7.0, 1]) color([1,0,0]) cube([0.5, 0.5, 2], center=true);
translate([2.5, -7.0, 1]) color([1,0,0]) cube([0.5, 0.5, 2], center=true);
translate([3.0, -7.0, 1]) color([1,0,0]) cube([0.5, 0.5, 2], center=true);
translate([3.5, -7.0, 1]) color([1,0,0]) cube([0.5, 0.5, 2], center=true);
translate([4.0, -7.0, 1]) color([1,0,0]) cube([0.5, 0.5, 2], center=true);
translate([4.5, -7.0, 1]) color([1,0,0]) cube([0.5, 0.5, 2], center=true);
translate([5.0, -7.0, 1]) color([1,0,0]) cube([0.5, 0.5, 2], center=true);
translate([5.5, -7.0, 1]) color([1,0,0]) cube([0.5, 0.5, 2], center=true);
translate([6.0, -7.0, 1]) color([1,0,0]) cube([0.5, 0.5, 2], center=true);
translate([6.5, -7.0, 1]) color([1,0,0]) cube([0.5, 0.5, 2], center=true);
translate([7.0, -7.0, 1]) color([1,0,0]) cube([0.5, 0.5, 2], center=true);
translate([7.5, -7.0, 1]) color([1,0,0]) cube([0.5, 0.5, 2], center=true);
translate([8.0, -7.0, 1]) color([1,0,0]) cube([0.5, 0.5, 2], center=true);
translate([8.5, -7.0, 1]) color([1,0,0]) cube([0.5, 0.5, 2], center=true);
translate([9.0, -7.0, 1]) color([1,0,0]) cube([0.5, 0.5, 2], center=true);
translate([9.5, -7.0, 1]) color([1,0,0]) cube([0.5, 0.5, 2], center=true);
translate([10.0, -7.0, 1]) color([1,0,0]) cube([0.5, 0.5, 2], center=true);
translate([10.5, -7.0, 1]) color([1,0,0]) cube([0.5, 0.5, 2], center=true);
translate([11.0, -7.0, 1]) color([1,0,0]) cube([0.5, 0.5, 2], center=true);
translate([11.5, -7.0, 1]) color([1,0,0]) cube([0.5, 0.5, 2], center=true);
translate([12.0, -7.0, 1]) color([1,0,0]) cube([0.5, 0.5, 2], center=true);
translate([12.5, -7.0, 1]) color([1,0,0]) cube([0.5, 0.5, 2], center=true);
translate([13.0, -7.0, 1]) color([1,0,0]) cube([0.5, 0.5, 2], center=true);
translate([13.5, -7.0, 1]) color([1,0,0]) cube([0.5, 0.5, 2], center=true);
translate([14.0, -7.0, 1]) color([1,0,0]) cube([0.5, 0.5, 2], center=true);
translate([14.5, -7.0, 1]) color([1,0,0]) cube([0.5, 0.5, 2], center=true);
translate([15.0, -7.0, 1]) color([1,0,0]) cube([0.5, 0.5, 2], center=true);
translate([15.5, -7.0, 1]) color([1,0,0]) cube([0.5, 0.5, 2], center=true);
translate([16.0, -7.0, 1]) color([1,0,0]) cube([0.5, 0.5, 2], center=true);
translate([16.5, -7.0, 1]) color([1,0,0]) cube([0.5, 0.5, 2], center=true);
translate([17.0, -7.0, 1]) color([1,0,0]) cube([0.5, 0.5, 2], center=true);
translate([17.5, -7.0, 1]) color([1,0,0]) cube([0.5, 0.5, 2], center=true);
translate([18.0, -7.0, 1]) color([1,0,0]) cube([0.5, 0.5, 2], center=true);
translate([18.5, -7.0, 1]) color([1,0,0]) cube([0.5, 0.5, 2], center=true);
translate([19.0, -7.0, 1]) color([1,0,0]) cube([0.5, 0.5, 2], center=true);
translate([19.5, -7.0, 1]) color([1,0,0]) cube([0.5, 0.5, 2], center=true);
translate([20.0, -7.0, 1]) color([1,0,0]) cube([0.5, 0.5, 2], center=true);
translate([20.5, -7.0, 1]) color([1,0,0]) cube([0.5, 0.5, 2], center=true);
translate([21.0, -7.0, 1]) color([1,0,0]) cube([0.5, 0.5, 2], center=true);
translate([21.5, -7.0, 1]) color([1,0,0]) cube([0.5, 0.5, 2], center=true);
translate([22.0, -7.0, 1]) color([1,0,0]) cube([0.5, 0.5, 2], center=true);
translate([22.5, -7.0, 1]) color([1,0,0]) cube([0.5, 0.5, 2], center=true);
translate([23.0, -7.0, 1]) color([1,0,0]) cube([0.5, 0.5, 2], center=true);
translate([23.5, -7.0, 1]) color([1,0,0]) cube([0.5, 0.5, 2], center=true);
translate([24.0, -7.0, 1]) color([1,0,0]) cube([0.5, 0.5, 2], center=true);
translate([24.5, -7.0, 1]) color([1,0,0]) cube([0.5, 0.5, 2], center=true);
translate([25.0, -7.0, 1]) color([1,0,0]) cube([0.5, 0.5, 2], center=true);
translate([25.5, -7.0, 1]) color([1,0,0]) cube([0.5, 0.5, 2], center=true);
translate([26.0, -7.0, 1]) color([1,0,0]) cube([0.5, 0.5, 2], center=true);
translate([26.5, -7.0, 1]) color([1,0,0]) cube([0.5, 0.5, 2], center=true);
translate([27.0, -7.0, 1]) color([1,0,0]) cube([0.5, 0.5, 2], center=true);
translate([27.5, -7.0, 1]) color([1,0,0]) cube([0.5, 0.5, 2], center=true);
translate([28.0, -7.0, 1]) color([1,0,0]) cube([0.5, 0.5, 2], center=true);
translate([28.5, -7.0, 1]) color([1,0,0]) cube([0.5, 0.5, 2], center=true);
translate([29.0, -7.0, 1]) color([1,0,0]) cube([0.5, 0.5, 2], center=true);
translate([29.5, -7.0, 1]) color([1,0,0]) cube([0.5, 0.5, 2], center=true);
translate([30.0, -7.0, 1]) color([1,0,0]) cube([0.5, 0.5, 2], center=true);
translate([-3.5, -3.5, 1]) color([1,0,0]) cube([0.5, 0.5, 2], center=true);
translate([-4.0, -3.5, 1]) color([1,0,0]) cube([0.5, 0.5, 2], center=true);
translate([-4.5, -3.5, 1]) color([1,0,0]) cube([0.5, 0.5, 2], center=true);
translate([-5.0, -3.5, 1]) color([1,0,0]) cube([0.5, 0.5, 2], center=true);
translate([-5.5, -3.5, 1]) color([1,0,0]) cube([0.5, 0.5, 2], center=true);
translate([-6.0, -3.5, 1]) color([1,0,0]) cube([0.5, 0.5, 2], center=true);
translate([-6.5, -3.5, 1]) color([1,0,0]) cube([0.5, 0.5, 2], center=true);
translate([-7.0, -3.5, 1]) color([1,0,0]) cube([0.5, 0.5, 2], center=true);
translate([-7.5, -3.5, 1]) color([1,0,0]) cube([0.5, 0.5, 2], center=true);
translate([-8.0, -3.5, 1]) color([1,0,0]) cube([0.5, 0.5, 2], center=true);
translate([-8.5, -3.5, 1]) color([1,0,0]) cube([0.5, 0.5, 2], center=true);
translate([-9.0, -3.5, 1]) color([1,0,0]) cube([0.5, 0.5, 2], center=true);
translate([-9.5, -3.5, 1]) color([1,0,0]) cube([0.5, 0.5, 2], center=true);
translate([-10.0, -3.5, 1]) color([1,0,0]) cube([0.5, 0.5, 2], center=true);
translate([-10.5, -3.5, 1]) color([1,0,0]) cube([0.5, 0.5, 2], center=true);
translate([-11.0, -3.5, 1]) color([1,0,0]) cube([0.5, 0.5, 2], center=true);
translate([-11.5, -3.5, 1]) color([1,0,0]) cube([0.5, 0.5, 2], center=true);
translate([-12.0, -3.5, 1]) color([1,0,0]) cube([0.5, 0.5, 2], center=true);
translate([-12.5, -3.5, 1]) color([1,0,0]) cube([0.5, 0.5, 2], center=true);
translate([-13.0, -3.5, 1]) color([1,0,0]) cube([0.5, 0.5, 2], center=true);
translate([-13.5, -3.5, 1]) color([1,0,0]) cube([0.5, 0.5, 2], center=true);
translate([-14.0, -3.5, 1]) color([1,0,0]) cube([0.5, 0.5, 2], center=true);
translate([-14.5, -3.5, 1]) color([1,0,0]) cube([0.5, 0.5, 2], center=true);
translate([-15.0, -3.5, 1]) color([1,0,0]) cube([0.5, 0.5, 2], center=true);
translate([-15.5, -3.5, 1]) color([1,0,0]) cube([0.5, 0.5, 2], center=true);
translate([-16.0, -3.5, 1]) color([1,0,0]) cube([0.5, 0.5, 2], center=true);
translate([-16.5, -3.5, 1]) color([1,0,0]) cube([0.5, 0.5, 2], center=true);
translate([-17.0, -3.5, 1]) color([1,0,0]) cube([0.5, 0.5, 2], center=true);
translate([-17.5, -3.5, 1]) color([1,0,0]) cube([0.5, 0.5, 2], center=true);
translate([-18.0, -3.5, 1]) color([1,0,0]) cube([0.5, 0.5, 2], center=true);
translate([-18.5, -3.5, 1]) color([1,0,0]) cube([0.5, 0.5, 2], center=true);
translate([-19.0, -3.5, 1]) color([1,0,0]) cube([0.5, 0.5, 2], center=true);
translate([-19.5, -3.5, 1]) color([1,0,0]) cube([0.5, 0.5, 2], center=true);
translate([-20.0, -3.5, 1]) color([1,0,0]) cube([0.5, 0.5, 2], center=true);
translate([-20.5, -3.5, 1]) color([1,0,0]) cube([0.5, 0.5, 2], center=true);
translate([-21.0, -3.5, 1]) color([1,0,0]) cube([0.5, 0.5, 2], center=true);
translate([-21.5, -3.5, 1]) color([1,0,0]) cube([0.5, 0.5, 2], center=true);
translate([-22.0, -3.5, 1]) color([1,0,0]) cube([0.5, 0.5, 2], center=true);
translate([-22.5, -3.5, 1]) color([1,0,0]) cube([0.5, 0.5, 2], center=true);
translate([-23.0, -3.5, 1]) color([1,0,0]) cube([0.5, 0.5, 2], center=true);
translate([-23.5, -3.5, 1]) color([1,0,0]) cube([0.5, 0.5, 2], center=true);
translate([-24.0, -3.5, 1]) color([1,0,0]) cube([0.5, 0.5, 2], center=true);
translate([-24.5, -3.5, 1]) color([1,0,0]) cube([0.5, 0.5, 2], center=true);
translate([-25.0, -3.5, 1]) color([1,0,0]) cube([0.5, 0.5, 2], center=true);
translate([-25.5, -3.5, 1]) color([1,0,0]) cube([0.5, 0.5, 2], center=true);
translate([-26.0, -3.5, 1]) color([1,0,0]) cube([0.5, 0.5, 2], center=true);
translate([-26.5, -3.5, 1]) color([1,0,0]) cube([0.5, 0.5, 2], center=true);
translate([-27.0, -3.5, 1]) color([1,0,0]) cube([0.5, 0.5, 2], center=true);
translate([-27.5, -3.5, 1]) color([1,0,0]) cube([0.5, 0.5, 2], center=true);
translate([-28.0, -3.5, 1]) color([1,0,0]) cube([0.5, 0.5, 2], center=true);
translate([-28.5, -3.5, 1]) color([1,0,0]) cube([0.5, 0.5, 2], center=true);
translate([-29.0, -3.5, 1]) color([1,0,0]) cube([0.5, 0.5, 2], center=true);
translate([-29.5, -3.5, 1]) color([1,0,0]) cube([0.5, 0.5, 2], center=true);
translate([-30.0, -3.5, 1]) color([1,0,0]) cube([0.5, 0.5, 2], center=true);
translate([-3.5, -7.0, 1]) color([1,0,0]) cube([0.5, 0.5, 2], center=true);
translate([-4.0, -7.0, 1]) color([1,0,0]) cube([0.5, 0.5, 2], center=true);
translate([-4.5, -7.0, 1]) color([1,0,0]) cube([0.5, 0.5, 2], center=true);
translate([-5.0, -7.0, 1]) color([1,0,0]) cube([0.5, 0.5, 2], center=true);
translate([-5.5, -7.0, 1]) color([1,0,0]) cube([0.5, 0.5, 2], center=true);
translate([-6.0, -7.0, 1]) color([1,0,0]) cube([0.5, 0.5, 2], center=true);
translate([-6.5, -7.0, 1]) color([1,0,0]) cube([0.5, 0.5, 2], center=true);
translate([-7.0, -7.0, 1]) color([1,0,0]) cube([0.5, 0.5, 2], center=true);
translate([-7.5, -7.0, 1]) color([1,0,0]) cube([0.5, 0.5, 2], center=true);
translate([-8.0, -7.0, 1]) color([1,0,0]) cube([0.5, 0.5, 2], center=true);
translate([-8.5, -7.0, 1]) color([1,0,0]) cube([0.5, 0.5, 2], center=true);
translate([-9.0, -7.0, 1]) color([1,0,0]) cube([0.5, 0.5, 2], center=true);
translate([-9.5, -7.0, 1]) color([1,0,0]) cube([0.5, 0.5, 2], center=true);
translate([-10.0, -7.0, 1]) color([1,0,0]) cube([0.5, 0.5, 2], center=true);
translate([-10.5, -7.0, 1]) color([1,0,0]) cube([0.5, 0.5, 2], center=true);
translate([-11.0, -7.0, 1]) color([1,0,0]) cube([0.5, 0.5, 2], center=true);
translate([-11.5, -7.0, 1]) color([1,0,0]) cube([0.5, 0.5, 2], center=true);
translate([-12.0, -7.0, 1]) color([1,0,0]) cube([0.5, 0.5, 2], center=true);
translate([-12.5, -7.0, 1]) color([1,0,0]) cube([0.5, 0.5, 2], center=true);
translate([-13.0, -7.0, 1]) color([1,0,0]) cube([0.5, 0.5, 2], center=true);
translate([-13.5, -7.0, 1]) color([1,0,0]) cube([0.5, 0.5, 2], center=true);
translate([-14.0, -7.0, 1]) color([1,0,0]) cube([0.5, 0.5, 2], center=true);
translate([-14.5, -7.0, 1]) color([1,0,0]) cube([0.5, 0.5, 2], center=true);
translate([-15.0, -7.0, 1]) color([1,0,0]) cube([0.5, 0.5, 2], center=true);
translate([-15.5, -7.0, 1]) color([1,0,0]) cube([0.5, 0.5, 2], center=true);
translate([-16.0, -7.0, 1]) color([1,0,0]) cube([0.5, 0.5, 2], center=true);
translate([-16.5, -7.0, 1]) color([1,0,0]) cube([0.5, 0.5, 2], center=true);
translate([-17.0, -7.0, 1]) color([1,0,0]) cube([0.5, 0.5, 2], center=true);
translate([-17.5, -7.0, 1]) color([1,0,0]) cube([0.5, 0.5, 2], center=true);
translate([-18.0, -7.0, 1]) color([1,0,0]) cube([0.5, 0.5, 2], center=true);
translate([-18.5, -7.0, 1]) color([1,0,0]) cube([0.5, 0.5, 2], center=true);
translate([-19.0, -7.0, 1]) color([1,0,0]) cube([0.5, 0.5, 2], center=true);
translate([-19.5, -7.0, 1]) color([1,0,0]) cube([0.5, 0.5, 2], center=true);
translate([-20.0, -7.0, 1]) color([1,0,0]) cube([0.5, 0.5, 2], center=true);
translate([-20.5, -7.0, 1]) color([1,0,0]) cube([0.5, 0.5, 2], center=true);
translate([-21.0, -7.0, 1]) color([1,0,0]) cube([0.5, 0.5, 2], center=true);
translate([-21.5, -7.0, 1]) color([1,0,0]) cube([0.5, 0.5, 2], center=true);
translate([-22.0, -7.0, 1]) color([1,0,0]) cube([0.5, 0.5, 2], center=true);
translate([-22.5, -7.0, 1]) color([1,0,0]) cube([0.5, 0.5, 2], center=true);
translate([-23.0, -7.0, 1]) color([1,0,0]) cube([0.5, 0.5, 2], center=true);
translate([-23.5, -7.0, 1]) color([1,0,0]) cube([0.5, 0.5, 2], center=true);
translate([-24.0, -7.0, 1]) color([1,0,0]) cube([0.5, 0.5, 2], center=true);
translate([-24.5, -7.0, 1]) color([1,0,0]) cube([0.5, 0.5, 2], center=true);
translate([-25.0, -7.0, 1]) color([1,0,0]) cube([0.5, 0.5, 2], center=true);
translate([-25.5, -7.0, 1]) color([1,0,0]) cube([0.5, 0.5, 2], center=true);
translate([-26.0, -7.0, 1]) color([1,0,0]) cube([0.5, 0.5, 2], center=true);
translate([-26.5, -7.0, 1]) color([1,0,0]) cube([0.5, 0.5, 2], center=true);
translate([-27.0, -7.0, 1]) color([1,0,0]) cube([0.5, 0.5, 2], center=true);
translate([-27.5, -7.0, 1]) color([1,0,0]) cube([0.5, 0.5, 2], center=true);
translate([-28.0, -7.0, 1]) color([1,0,0]) cube([0.5, 0.5, 2], center=true);
translate([-28.5, -7.0, 1]) color([1,0,0]) cube([0.5, 0.5, 2], center=true);
translate([-29.0, -7.0, 1]) color([1,0,0]) cube([0.5, 0.5, 2], center=true);
translate([-29.5, -7.0, 1]) color([1,0,0]) cube([0.5, 0.5, 2], center=true);
translate([-30.0, -7.0, 1]) color([1,0,0]) cube([0.5, 0.5, 2], center=true);
